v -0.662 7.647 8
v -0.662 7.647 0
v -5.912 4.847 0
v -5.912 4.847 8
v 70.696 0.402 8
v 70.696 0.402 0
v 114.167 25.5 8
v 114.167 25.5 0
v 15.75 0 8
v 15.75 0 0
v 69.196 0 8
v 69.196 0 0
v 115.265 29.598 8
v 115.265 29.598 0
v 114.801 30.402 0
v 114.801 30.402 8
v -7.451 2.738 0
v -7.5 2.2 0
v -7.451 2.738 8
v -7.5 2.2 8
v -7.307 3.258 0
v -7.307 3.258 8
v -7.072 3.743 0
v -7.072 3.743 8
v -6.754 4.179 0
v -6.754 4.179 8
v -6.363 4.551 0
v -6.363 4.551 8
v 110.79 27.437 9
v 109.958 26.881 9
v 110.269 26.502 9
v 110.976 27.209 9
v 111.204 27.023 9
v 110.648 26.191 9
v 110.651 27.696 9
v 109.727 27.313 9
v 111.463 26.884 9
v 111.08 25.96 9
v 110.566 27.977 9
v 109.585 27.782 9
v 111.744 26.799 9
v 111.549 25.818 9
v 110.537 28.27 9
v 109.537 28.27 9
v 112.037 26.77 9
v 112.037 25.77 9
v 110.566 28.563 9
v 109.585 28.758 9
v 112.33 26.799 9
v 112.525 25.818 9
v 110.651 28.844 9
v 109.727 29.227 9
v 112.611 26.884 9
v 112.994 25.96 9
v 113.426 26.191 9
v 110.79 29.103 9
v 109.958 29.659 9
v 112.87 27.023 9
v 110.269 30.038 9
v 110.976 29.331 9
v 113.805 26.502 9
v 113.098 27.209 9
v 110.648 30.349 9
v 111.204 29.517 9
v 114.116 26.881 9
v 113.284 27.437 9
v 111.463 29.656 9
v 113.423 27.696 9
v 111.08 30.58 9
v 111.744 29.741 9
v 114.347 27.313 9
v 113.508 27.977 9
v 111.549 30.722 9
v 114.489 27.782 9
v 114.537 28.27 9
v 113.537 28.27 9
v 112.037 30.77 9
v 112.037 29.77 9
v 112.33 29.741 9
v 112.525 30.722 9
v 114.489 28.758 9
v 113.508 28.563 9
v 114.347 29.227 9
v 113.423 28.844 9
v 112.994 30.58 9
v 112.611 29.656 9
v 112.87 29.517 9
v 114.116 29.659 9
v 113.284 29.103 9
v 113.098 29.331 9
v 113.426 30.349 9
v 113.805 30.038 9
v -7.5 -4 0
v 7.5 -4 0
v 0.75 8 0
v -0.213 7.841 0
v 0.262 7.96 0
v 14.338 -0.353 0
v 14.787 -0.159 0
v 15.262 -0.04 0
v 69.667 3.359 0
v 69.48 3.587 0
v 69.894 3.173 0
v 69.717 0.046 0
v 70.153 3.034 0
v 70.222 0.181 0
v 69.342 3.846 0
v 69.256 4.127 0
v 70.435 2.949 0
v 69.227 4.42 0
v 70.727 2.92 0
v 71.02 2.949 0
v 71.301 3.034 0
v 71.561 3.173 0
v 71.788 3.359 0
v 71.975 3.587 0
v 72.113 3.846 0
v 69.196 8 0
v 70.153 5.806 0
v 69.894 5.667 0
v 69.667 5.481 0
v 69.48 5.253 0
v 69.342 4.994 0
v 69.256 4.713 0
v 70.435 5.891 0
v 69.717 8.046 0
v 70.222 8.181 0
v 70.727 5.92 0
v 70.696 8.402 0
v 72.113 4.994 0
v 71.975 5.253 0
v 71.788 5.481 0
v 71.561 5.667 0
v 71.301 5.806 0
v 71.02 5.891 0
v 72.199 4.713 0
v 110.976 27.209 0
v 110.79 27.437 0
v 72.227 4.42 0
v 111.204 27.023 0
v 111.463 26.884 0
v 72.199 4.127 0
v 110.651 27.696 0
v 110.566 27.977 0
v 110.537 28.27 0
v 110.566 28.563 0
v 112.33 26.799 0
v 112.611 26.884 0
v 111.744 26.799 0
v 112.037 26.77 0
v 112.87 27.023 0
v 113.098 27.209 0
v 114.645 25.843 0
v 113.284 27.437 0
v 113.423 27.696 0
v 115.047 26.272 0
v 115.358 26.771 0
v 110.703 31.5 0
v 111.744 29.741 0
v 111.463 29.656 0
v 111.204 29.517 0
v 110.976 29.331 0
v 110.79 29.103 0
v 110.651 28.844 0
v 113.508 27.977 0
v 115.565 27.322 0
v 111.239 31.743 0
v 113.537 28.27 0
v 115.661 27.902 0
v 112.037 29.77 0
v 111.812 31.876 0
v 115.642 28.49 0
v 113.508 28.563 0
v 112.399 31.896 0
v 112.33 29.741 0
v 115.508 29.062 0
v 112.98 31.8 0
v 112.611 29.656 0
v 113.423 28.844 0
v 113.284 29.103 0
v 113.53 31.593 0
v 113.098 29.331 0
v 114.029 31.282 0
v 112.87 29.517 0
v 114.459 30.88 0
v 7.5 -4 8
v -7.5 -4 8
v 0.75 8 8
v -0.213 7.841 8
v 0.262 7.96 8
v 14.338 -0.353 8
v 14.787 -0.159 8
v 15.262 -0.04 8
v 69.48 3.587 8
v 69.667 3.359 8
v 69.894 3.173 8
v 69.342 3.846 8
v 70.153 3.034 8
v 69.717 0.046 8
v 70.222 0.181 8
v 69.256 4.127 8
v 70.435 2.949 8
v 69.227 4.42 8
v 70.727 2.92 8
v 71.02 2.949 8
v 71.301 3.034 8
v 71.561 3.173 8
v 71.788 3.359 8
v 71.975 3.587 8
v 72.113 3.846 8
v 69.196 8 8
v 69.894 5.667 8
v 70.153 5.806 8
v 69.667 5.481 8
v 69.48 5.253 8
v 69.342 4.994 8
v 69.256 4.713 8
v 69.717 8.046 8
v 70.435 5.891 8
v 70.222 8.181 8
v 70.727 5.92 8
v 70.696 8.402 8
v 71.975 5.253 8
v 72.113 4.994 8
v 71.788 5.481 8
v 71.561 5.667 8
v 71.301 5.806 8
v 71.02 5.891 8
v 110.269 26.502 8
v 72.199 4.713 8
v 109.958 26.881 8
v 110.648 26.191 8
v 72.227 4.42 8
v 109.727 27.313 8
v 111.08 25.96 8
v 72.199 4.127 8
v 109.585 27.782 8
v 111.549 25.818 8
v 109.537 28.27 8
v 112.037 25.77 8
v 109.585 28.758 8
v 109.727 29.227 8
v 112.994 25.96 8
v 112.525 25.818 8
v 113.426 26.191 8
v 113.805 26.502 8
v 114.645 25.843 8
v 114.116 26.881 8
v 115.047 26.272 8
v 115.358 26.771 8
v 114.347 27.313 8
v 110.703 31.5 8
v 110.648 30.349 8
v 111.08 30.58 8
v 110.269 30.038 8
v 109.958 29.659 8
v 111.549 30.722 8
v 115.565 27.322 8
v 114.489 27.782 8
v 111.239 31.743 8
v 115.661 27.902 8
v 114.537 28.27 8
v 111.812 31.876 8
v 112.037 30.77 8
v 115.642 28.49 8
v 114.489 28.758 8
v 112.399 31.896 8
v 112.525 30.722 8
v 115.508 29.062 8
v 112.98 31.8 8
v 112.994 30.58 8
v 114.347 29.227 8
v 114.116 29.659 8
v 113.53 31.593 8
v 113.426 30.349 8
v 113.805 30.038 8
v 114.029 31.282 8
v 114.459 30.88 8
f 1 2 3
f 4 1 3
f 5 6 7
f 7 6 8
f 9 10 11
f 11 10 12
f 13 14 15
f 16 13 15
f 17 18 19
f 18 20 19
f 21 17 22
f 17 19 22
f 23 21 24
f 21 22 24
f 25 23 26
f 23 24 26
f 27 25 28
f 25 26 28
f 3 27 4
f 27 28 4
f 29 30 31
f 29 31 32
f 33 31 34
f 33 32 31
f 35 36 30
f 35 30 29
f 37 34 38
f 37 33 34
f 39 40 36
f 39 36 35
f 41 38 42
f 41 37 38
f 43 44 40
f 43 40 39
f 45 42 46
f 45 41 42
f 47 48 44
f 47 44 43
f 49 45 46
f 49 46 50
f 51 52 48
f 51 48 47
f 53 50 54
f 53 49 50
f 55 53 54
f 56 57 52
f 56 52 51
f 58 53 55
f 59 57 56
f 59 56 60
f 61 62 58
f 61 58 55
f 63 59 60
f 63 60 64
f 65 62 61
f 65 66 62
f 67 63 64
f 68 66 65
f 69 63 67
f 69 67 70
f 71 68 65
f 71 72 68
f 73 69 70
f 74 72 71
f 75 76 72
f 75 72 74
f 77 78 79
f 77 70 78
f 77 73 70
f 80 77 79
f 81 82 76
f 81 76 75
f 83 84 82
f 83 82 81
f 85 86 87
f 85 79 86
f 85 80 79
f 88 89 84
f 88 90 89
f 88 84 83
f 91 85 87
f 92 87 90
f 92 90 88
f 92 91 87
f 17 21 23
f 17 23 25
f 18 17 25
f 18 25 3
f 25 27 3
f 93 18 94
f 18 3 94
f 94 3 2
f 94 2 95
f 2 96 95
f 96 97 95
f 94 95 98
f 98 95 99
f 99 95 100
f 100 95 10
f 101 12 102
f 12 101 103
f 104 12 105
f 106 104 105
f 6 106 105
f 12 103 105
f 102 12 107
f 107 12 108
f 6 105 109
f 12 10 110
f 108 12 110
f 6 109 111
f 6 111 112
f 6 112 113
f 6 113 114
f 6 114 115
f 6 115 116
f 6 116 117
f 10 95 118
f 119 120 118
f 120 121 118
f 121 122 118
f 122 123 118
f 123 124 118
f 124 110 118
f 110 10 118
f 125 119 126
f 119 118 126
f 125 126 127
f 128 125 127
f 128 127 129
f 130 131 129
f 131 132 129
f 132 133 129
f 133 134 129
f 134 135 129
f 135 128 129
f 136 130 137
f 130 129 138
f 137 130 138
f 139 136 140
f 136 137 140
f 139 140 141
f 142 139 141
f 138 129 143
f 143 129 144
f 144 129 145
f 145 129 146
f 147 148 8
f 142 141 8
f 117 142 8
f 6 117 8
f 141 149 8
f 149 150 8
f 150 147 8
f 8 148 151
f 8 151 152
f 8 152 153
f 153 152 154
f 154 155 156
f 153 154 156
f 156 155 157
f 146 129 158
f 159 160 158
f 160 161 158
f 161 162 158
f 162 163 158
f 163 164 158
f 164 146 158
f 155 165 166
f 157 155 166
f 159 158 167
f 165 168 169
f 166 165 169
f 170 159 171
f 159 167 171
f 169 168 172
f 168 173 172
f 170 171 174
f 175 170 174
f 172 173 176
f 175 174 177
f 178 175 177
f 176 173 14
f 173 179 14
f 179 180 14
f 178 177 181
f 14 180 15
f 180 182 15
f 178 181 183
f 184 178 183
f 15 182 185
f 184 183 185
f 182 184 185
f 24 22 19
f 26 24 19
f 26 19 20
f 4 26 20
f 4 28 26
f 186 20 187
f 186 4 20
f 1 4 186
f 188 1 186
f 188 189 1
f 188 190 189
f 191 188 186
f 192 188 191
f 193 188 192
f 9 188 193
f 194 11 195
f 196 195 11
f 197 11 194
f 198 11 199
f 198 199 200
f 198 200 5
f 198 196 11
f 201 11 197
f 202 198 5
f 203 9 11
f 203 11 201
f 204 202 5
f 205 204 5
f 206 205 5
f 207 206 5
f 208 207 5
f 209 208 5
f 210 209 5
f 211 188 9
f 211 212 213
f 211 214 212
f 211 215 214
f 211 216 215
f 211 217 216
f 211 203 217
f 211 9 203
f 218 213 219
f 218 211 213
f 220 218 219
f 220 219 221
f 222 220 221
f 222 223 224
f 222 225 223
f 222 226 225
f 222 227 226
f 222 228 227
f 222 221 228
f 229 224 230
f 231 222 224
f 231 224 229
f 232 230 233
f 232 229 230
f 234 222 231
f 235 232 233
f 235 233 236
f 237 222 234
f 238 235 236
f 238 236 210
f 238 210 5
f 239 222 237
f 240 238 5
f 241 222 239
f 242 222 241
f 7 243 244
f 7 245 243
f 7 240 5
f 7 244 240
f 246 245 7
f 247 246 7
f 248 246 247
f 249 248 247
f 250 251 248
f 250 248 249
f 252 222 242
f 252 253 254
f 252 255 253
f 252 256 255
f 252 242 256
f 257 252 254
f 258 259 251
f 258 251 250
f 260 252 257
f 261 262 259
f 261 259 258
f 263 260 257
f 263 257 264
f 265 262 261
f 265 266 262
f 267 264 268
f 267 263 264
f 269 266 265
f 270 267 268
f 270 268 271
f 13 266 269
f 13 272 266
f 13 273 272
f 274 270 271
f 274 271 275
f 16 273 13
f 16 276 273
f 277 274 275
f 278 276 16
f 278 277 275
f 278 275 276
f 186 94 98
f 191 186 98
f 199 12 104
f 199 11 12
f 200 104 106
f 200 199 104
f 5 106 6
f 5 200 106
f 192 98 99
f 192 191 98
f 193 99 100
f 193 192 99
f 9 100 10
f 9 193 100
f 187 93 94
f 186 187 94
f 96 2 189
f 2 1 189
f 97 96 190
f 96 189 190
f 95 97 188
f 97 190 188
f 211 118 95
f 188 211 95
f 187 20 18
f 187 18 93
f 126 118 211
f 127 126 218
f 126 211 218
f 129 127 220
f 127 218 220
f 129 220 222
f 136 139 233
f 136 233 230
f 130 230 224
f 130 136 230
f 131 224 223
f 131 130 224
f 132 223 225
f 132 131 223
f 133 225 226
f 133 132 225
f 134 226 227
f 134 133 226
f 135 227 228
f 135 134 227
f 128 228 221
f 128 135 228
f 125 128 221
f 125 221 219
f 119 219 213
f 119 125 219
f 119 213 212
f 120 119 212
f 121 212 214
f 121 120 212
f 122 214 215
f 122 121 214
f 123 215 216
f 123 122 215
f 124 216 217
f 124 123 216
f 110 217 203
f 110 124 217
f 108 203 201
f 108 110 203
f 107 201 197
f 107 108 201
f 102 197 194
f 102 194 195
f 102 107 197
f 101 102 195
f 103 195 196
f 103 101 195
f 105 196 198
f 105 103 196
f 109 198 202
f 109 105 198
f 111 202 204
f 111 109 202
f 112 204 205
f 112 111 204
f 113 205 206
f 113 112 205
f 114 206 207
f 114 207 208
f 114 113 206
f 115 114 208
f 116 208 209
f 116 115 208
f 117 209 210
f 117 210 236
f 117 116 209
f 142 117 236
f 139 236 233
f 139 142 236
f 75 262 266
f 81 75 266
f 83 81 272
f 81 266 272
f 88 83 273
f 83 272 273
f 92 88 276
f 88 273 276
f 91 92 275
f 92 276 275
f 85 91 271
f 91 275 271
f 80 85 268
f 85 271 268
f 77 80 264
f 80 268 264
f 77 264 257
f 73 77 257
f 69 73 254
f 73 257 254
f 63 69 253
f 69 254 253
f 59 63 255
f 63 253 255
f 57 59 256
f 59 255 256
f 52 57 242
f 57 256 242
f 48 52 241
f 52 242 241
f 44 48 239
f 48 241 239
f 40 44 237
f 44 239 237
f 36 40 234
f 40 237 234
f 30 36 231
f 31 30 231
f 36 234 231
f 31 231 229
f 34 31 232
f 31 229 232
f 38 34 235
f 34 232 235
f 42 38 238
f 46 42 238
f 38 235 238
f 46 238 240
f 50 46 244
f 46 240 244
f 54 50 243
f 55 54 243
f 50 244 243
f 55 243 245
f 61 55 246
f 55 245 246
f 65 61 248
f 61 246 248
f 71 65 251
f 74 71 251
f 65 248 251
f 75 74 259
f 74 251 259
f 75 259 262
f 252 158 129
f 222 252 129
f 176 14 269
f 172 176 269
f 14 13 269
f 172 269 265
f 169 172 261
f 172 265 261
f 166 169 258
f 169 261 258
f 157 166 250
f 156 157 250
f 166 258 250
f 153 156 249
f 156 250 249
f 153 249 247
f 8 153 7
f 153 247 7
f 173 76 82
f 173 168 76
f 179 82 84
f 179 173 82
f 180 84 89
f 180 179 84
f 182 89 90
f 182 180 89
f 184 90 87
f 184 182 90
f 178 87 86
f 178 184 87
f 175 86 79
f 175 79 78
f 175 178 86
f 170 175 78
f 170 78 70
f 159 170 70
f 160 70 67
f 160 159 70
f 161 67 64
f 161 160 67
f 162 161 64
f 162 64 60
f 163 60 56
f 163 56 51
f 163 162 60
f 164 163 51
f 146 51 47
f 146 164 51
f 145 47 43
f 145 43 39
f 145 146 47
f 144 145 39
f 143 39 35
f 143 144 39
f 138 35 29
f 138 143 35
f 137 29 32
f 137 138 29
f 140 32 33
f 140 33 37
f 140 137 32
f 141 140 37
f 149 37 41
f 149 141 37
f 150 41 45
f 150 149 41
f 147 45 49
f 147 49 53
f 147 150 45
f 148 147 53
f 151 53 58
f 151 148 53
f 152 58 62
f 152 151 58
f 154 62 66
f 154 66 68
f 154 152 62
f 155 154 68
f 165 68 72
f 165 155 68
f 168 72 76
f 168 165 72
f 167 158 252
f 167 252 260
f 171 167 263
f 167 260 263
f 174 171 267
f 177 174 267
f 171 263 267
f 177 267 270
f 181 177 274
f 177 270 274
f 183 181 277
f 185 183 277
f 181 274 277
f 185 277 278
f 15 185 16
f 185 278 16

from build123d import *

# Parameters (mm, degrees)
SKETCH_1_R      = 1.5
EXTRUDE_1_DEPTH = 8
FILLET_1_R      = 3
SKETCH_2_R      = 2.5
SKETCH_2_R_2    = 1.5
EXTRUDE_2_DEPTH = 1


with BuildPart() as part:
    # 草图1 → 凸台-拉伸1 (new body)
    with BuildSketch(Plane.XY):
        Polygon((-7.5, 4), (-7.5, -4), (7.5, -4), (15, 0), (70, 0), (116.765371804, 27), (113.301270189, 33), (70, 8), (0, 8), align=None)
        with Locations((112.0368731, 28.27)):
            Circle(SKETCH_1_R, mode=Mode.SUBTRACT)
        with Locations((70.727461339, 4.42)):
            Circle(SKETCH_1_R, mode=Mode.SUBTRACT)
    extrude(amount=EXTRUDE_1_DEPTH)

    # 圆角1
    fillet_1_edges = [part.edges().sort_by_distance(p)[0] for p in [
        (-7.5, 4, 4),
        (0, 8, 4),
        (70, 8, 4),
        (113.301270189, 33, 4),
        (116.765371804, 27, 4),
        (70, 0, 4),
        (15, 0, 4),
    ]]
    fillet(fillet_1_edges, radius=FILLET_1_R)

    # 草图2 → 凸台-拉伸2 (add)
    with BuildSketch(Plane.XY.offset(8)):
        with Locations((112.0368731, 28.27)):
            Circle(SKETCH_2_R)
        with Locations((112.0368731, 28.27)):
            Circle(SKETCH_2_R_2, mode=Mode.SUBTRACT)
    extrude(amount=EXTRUDE_2_DEPTH)


solid = part.part
